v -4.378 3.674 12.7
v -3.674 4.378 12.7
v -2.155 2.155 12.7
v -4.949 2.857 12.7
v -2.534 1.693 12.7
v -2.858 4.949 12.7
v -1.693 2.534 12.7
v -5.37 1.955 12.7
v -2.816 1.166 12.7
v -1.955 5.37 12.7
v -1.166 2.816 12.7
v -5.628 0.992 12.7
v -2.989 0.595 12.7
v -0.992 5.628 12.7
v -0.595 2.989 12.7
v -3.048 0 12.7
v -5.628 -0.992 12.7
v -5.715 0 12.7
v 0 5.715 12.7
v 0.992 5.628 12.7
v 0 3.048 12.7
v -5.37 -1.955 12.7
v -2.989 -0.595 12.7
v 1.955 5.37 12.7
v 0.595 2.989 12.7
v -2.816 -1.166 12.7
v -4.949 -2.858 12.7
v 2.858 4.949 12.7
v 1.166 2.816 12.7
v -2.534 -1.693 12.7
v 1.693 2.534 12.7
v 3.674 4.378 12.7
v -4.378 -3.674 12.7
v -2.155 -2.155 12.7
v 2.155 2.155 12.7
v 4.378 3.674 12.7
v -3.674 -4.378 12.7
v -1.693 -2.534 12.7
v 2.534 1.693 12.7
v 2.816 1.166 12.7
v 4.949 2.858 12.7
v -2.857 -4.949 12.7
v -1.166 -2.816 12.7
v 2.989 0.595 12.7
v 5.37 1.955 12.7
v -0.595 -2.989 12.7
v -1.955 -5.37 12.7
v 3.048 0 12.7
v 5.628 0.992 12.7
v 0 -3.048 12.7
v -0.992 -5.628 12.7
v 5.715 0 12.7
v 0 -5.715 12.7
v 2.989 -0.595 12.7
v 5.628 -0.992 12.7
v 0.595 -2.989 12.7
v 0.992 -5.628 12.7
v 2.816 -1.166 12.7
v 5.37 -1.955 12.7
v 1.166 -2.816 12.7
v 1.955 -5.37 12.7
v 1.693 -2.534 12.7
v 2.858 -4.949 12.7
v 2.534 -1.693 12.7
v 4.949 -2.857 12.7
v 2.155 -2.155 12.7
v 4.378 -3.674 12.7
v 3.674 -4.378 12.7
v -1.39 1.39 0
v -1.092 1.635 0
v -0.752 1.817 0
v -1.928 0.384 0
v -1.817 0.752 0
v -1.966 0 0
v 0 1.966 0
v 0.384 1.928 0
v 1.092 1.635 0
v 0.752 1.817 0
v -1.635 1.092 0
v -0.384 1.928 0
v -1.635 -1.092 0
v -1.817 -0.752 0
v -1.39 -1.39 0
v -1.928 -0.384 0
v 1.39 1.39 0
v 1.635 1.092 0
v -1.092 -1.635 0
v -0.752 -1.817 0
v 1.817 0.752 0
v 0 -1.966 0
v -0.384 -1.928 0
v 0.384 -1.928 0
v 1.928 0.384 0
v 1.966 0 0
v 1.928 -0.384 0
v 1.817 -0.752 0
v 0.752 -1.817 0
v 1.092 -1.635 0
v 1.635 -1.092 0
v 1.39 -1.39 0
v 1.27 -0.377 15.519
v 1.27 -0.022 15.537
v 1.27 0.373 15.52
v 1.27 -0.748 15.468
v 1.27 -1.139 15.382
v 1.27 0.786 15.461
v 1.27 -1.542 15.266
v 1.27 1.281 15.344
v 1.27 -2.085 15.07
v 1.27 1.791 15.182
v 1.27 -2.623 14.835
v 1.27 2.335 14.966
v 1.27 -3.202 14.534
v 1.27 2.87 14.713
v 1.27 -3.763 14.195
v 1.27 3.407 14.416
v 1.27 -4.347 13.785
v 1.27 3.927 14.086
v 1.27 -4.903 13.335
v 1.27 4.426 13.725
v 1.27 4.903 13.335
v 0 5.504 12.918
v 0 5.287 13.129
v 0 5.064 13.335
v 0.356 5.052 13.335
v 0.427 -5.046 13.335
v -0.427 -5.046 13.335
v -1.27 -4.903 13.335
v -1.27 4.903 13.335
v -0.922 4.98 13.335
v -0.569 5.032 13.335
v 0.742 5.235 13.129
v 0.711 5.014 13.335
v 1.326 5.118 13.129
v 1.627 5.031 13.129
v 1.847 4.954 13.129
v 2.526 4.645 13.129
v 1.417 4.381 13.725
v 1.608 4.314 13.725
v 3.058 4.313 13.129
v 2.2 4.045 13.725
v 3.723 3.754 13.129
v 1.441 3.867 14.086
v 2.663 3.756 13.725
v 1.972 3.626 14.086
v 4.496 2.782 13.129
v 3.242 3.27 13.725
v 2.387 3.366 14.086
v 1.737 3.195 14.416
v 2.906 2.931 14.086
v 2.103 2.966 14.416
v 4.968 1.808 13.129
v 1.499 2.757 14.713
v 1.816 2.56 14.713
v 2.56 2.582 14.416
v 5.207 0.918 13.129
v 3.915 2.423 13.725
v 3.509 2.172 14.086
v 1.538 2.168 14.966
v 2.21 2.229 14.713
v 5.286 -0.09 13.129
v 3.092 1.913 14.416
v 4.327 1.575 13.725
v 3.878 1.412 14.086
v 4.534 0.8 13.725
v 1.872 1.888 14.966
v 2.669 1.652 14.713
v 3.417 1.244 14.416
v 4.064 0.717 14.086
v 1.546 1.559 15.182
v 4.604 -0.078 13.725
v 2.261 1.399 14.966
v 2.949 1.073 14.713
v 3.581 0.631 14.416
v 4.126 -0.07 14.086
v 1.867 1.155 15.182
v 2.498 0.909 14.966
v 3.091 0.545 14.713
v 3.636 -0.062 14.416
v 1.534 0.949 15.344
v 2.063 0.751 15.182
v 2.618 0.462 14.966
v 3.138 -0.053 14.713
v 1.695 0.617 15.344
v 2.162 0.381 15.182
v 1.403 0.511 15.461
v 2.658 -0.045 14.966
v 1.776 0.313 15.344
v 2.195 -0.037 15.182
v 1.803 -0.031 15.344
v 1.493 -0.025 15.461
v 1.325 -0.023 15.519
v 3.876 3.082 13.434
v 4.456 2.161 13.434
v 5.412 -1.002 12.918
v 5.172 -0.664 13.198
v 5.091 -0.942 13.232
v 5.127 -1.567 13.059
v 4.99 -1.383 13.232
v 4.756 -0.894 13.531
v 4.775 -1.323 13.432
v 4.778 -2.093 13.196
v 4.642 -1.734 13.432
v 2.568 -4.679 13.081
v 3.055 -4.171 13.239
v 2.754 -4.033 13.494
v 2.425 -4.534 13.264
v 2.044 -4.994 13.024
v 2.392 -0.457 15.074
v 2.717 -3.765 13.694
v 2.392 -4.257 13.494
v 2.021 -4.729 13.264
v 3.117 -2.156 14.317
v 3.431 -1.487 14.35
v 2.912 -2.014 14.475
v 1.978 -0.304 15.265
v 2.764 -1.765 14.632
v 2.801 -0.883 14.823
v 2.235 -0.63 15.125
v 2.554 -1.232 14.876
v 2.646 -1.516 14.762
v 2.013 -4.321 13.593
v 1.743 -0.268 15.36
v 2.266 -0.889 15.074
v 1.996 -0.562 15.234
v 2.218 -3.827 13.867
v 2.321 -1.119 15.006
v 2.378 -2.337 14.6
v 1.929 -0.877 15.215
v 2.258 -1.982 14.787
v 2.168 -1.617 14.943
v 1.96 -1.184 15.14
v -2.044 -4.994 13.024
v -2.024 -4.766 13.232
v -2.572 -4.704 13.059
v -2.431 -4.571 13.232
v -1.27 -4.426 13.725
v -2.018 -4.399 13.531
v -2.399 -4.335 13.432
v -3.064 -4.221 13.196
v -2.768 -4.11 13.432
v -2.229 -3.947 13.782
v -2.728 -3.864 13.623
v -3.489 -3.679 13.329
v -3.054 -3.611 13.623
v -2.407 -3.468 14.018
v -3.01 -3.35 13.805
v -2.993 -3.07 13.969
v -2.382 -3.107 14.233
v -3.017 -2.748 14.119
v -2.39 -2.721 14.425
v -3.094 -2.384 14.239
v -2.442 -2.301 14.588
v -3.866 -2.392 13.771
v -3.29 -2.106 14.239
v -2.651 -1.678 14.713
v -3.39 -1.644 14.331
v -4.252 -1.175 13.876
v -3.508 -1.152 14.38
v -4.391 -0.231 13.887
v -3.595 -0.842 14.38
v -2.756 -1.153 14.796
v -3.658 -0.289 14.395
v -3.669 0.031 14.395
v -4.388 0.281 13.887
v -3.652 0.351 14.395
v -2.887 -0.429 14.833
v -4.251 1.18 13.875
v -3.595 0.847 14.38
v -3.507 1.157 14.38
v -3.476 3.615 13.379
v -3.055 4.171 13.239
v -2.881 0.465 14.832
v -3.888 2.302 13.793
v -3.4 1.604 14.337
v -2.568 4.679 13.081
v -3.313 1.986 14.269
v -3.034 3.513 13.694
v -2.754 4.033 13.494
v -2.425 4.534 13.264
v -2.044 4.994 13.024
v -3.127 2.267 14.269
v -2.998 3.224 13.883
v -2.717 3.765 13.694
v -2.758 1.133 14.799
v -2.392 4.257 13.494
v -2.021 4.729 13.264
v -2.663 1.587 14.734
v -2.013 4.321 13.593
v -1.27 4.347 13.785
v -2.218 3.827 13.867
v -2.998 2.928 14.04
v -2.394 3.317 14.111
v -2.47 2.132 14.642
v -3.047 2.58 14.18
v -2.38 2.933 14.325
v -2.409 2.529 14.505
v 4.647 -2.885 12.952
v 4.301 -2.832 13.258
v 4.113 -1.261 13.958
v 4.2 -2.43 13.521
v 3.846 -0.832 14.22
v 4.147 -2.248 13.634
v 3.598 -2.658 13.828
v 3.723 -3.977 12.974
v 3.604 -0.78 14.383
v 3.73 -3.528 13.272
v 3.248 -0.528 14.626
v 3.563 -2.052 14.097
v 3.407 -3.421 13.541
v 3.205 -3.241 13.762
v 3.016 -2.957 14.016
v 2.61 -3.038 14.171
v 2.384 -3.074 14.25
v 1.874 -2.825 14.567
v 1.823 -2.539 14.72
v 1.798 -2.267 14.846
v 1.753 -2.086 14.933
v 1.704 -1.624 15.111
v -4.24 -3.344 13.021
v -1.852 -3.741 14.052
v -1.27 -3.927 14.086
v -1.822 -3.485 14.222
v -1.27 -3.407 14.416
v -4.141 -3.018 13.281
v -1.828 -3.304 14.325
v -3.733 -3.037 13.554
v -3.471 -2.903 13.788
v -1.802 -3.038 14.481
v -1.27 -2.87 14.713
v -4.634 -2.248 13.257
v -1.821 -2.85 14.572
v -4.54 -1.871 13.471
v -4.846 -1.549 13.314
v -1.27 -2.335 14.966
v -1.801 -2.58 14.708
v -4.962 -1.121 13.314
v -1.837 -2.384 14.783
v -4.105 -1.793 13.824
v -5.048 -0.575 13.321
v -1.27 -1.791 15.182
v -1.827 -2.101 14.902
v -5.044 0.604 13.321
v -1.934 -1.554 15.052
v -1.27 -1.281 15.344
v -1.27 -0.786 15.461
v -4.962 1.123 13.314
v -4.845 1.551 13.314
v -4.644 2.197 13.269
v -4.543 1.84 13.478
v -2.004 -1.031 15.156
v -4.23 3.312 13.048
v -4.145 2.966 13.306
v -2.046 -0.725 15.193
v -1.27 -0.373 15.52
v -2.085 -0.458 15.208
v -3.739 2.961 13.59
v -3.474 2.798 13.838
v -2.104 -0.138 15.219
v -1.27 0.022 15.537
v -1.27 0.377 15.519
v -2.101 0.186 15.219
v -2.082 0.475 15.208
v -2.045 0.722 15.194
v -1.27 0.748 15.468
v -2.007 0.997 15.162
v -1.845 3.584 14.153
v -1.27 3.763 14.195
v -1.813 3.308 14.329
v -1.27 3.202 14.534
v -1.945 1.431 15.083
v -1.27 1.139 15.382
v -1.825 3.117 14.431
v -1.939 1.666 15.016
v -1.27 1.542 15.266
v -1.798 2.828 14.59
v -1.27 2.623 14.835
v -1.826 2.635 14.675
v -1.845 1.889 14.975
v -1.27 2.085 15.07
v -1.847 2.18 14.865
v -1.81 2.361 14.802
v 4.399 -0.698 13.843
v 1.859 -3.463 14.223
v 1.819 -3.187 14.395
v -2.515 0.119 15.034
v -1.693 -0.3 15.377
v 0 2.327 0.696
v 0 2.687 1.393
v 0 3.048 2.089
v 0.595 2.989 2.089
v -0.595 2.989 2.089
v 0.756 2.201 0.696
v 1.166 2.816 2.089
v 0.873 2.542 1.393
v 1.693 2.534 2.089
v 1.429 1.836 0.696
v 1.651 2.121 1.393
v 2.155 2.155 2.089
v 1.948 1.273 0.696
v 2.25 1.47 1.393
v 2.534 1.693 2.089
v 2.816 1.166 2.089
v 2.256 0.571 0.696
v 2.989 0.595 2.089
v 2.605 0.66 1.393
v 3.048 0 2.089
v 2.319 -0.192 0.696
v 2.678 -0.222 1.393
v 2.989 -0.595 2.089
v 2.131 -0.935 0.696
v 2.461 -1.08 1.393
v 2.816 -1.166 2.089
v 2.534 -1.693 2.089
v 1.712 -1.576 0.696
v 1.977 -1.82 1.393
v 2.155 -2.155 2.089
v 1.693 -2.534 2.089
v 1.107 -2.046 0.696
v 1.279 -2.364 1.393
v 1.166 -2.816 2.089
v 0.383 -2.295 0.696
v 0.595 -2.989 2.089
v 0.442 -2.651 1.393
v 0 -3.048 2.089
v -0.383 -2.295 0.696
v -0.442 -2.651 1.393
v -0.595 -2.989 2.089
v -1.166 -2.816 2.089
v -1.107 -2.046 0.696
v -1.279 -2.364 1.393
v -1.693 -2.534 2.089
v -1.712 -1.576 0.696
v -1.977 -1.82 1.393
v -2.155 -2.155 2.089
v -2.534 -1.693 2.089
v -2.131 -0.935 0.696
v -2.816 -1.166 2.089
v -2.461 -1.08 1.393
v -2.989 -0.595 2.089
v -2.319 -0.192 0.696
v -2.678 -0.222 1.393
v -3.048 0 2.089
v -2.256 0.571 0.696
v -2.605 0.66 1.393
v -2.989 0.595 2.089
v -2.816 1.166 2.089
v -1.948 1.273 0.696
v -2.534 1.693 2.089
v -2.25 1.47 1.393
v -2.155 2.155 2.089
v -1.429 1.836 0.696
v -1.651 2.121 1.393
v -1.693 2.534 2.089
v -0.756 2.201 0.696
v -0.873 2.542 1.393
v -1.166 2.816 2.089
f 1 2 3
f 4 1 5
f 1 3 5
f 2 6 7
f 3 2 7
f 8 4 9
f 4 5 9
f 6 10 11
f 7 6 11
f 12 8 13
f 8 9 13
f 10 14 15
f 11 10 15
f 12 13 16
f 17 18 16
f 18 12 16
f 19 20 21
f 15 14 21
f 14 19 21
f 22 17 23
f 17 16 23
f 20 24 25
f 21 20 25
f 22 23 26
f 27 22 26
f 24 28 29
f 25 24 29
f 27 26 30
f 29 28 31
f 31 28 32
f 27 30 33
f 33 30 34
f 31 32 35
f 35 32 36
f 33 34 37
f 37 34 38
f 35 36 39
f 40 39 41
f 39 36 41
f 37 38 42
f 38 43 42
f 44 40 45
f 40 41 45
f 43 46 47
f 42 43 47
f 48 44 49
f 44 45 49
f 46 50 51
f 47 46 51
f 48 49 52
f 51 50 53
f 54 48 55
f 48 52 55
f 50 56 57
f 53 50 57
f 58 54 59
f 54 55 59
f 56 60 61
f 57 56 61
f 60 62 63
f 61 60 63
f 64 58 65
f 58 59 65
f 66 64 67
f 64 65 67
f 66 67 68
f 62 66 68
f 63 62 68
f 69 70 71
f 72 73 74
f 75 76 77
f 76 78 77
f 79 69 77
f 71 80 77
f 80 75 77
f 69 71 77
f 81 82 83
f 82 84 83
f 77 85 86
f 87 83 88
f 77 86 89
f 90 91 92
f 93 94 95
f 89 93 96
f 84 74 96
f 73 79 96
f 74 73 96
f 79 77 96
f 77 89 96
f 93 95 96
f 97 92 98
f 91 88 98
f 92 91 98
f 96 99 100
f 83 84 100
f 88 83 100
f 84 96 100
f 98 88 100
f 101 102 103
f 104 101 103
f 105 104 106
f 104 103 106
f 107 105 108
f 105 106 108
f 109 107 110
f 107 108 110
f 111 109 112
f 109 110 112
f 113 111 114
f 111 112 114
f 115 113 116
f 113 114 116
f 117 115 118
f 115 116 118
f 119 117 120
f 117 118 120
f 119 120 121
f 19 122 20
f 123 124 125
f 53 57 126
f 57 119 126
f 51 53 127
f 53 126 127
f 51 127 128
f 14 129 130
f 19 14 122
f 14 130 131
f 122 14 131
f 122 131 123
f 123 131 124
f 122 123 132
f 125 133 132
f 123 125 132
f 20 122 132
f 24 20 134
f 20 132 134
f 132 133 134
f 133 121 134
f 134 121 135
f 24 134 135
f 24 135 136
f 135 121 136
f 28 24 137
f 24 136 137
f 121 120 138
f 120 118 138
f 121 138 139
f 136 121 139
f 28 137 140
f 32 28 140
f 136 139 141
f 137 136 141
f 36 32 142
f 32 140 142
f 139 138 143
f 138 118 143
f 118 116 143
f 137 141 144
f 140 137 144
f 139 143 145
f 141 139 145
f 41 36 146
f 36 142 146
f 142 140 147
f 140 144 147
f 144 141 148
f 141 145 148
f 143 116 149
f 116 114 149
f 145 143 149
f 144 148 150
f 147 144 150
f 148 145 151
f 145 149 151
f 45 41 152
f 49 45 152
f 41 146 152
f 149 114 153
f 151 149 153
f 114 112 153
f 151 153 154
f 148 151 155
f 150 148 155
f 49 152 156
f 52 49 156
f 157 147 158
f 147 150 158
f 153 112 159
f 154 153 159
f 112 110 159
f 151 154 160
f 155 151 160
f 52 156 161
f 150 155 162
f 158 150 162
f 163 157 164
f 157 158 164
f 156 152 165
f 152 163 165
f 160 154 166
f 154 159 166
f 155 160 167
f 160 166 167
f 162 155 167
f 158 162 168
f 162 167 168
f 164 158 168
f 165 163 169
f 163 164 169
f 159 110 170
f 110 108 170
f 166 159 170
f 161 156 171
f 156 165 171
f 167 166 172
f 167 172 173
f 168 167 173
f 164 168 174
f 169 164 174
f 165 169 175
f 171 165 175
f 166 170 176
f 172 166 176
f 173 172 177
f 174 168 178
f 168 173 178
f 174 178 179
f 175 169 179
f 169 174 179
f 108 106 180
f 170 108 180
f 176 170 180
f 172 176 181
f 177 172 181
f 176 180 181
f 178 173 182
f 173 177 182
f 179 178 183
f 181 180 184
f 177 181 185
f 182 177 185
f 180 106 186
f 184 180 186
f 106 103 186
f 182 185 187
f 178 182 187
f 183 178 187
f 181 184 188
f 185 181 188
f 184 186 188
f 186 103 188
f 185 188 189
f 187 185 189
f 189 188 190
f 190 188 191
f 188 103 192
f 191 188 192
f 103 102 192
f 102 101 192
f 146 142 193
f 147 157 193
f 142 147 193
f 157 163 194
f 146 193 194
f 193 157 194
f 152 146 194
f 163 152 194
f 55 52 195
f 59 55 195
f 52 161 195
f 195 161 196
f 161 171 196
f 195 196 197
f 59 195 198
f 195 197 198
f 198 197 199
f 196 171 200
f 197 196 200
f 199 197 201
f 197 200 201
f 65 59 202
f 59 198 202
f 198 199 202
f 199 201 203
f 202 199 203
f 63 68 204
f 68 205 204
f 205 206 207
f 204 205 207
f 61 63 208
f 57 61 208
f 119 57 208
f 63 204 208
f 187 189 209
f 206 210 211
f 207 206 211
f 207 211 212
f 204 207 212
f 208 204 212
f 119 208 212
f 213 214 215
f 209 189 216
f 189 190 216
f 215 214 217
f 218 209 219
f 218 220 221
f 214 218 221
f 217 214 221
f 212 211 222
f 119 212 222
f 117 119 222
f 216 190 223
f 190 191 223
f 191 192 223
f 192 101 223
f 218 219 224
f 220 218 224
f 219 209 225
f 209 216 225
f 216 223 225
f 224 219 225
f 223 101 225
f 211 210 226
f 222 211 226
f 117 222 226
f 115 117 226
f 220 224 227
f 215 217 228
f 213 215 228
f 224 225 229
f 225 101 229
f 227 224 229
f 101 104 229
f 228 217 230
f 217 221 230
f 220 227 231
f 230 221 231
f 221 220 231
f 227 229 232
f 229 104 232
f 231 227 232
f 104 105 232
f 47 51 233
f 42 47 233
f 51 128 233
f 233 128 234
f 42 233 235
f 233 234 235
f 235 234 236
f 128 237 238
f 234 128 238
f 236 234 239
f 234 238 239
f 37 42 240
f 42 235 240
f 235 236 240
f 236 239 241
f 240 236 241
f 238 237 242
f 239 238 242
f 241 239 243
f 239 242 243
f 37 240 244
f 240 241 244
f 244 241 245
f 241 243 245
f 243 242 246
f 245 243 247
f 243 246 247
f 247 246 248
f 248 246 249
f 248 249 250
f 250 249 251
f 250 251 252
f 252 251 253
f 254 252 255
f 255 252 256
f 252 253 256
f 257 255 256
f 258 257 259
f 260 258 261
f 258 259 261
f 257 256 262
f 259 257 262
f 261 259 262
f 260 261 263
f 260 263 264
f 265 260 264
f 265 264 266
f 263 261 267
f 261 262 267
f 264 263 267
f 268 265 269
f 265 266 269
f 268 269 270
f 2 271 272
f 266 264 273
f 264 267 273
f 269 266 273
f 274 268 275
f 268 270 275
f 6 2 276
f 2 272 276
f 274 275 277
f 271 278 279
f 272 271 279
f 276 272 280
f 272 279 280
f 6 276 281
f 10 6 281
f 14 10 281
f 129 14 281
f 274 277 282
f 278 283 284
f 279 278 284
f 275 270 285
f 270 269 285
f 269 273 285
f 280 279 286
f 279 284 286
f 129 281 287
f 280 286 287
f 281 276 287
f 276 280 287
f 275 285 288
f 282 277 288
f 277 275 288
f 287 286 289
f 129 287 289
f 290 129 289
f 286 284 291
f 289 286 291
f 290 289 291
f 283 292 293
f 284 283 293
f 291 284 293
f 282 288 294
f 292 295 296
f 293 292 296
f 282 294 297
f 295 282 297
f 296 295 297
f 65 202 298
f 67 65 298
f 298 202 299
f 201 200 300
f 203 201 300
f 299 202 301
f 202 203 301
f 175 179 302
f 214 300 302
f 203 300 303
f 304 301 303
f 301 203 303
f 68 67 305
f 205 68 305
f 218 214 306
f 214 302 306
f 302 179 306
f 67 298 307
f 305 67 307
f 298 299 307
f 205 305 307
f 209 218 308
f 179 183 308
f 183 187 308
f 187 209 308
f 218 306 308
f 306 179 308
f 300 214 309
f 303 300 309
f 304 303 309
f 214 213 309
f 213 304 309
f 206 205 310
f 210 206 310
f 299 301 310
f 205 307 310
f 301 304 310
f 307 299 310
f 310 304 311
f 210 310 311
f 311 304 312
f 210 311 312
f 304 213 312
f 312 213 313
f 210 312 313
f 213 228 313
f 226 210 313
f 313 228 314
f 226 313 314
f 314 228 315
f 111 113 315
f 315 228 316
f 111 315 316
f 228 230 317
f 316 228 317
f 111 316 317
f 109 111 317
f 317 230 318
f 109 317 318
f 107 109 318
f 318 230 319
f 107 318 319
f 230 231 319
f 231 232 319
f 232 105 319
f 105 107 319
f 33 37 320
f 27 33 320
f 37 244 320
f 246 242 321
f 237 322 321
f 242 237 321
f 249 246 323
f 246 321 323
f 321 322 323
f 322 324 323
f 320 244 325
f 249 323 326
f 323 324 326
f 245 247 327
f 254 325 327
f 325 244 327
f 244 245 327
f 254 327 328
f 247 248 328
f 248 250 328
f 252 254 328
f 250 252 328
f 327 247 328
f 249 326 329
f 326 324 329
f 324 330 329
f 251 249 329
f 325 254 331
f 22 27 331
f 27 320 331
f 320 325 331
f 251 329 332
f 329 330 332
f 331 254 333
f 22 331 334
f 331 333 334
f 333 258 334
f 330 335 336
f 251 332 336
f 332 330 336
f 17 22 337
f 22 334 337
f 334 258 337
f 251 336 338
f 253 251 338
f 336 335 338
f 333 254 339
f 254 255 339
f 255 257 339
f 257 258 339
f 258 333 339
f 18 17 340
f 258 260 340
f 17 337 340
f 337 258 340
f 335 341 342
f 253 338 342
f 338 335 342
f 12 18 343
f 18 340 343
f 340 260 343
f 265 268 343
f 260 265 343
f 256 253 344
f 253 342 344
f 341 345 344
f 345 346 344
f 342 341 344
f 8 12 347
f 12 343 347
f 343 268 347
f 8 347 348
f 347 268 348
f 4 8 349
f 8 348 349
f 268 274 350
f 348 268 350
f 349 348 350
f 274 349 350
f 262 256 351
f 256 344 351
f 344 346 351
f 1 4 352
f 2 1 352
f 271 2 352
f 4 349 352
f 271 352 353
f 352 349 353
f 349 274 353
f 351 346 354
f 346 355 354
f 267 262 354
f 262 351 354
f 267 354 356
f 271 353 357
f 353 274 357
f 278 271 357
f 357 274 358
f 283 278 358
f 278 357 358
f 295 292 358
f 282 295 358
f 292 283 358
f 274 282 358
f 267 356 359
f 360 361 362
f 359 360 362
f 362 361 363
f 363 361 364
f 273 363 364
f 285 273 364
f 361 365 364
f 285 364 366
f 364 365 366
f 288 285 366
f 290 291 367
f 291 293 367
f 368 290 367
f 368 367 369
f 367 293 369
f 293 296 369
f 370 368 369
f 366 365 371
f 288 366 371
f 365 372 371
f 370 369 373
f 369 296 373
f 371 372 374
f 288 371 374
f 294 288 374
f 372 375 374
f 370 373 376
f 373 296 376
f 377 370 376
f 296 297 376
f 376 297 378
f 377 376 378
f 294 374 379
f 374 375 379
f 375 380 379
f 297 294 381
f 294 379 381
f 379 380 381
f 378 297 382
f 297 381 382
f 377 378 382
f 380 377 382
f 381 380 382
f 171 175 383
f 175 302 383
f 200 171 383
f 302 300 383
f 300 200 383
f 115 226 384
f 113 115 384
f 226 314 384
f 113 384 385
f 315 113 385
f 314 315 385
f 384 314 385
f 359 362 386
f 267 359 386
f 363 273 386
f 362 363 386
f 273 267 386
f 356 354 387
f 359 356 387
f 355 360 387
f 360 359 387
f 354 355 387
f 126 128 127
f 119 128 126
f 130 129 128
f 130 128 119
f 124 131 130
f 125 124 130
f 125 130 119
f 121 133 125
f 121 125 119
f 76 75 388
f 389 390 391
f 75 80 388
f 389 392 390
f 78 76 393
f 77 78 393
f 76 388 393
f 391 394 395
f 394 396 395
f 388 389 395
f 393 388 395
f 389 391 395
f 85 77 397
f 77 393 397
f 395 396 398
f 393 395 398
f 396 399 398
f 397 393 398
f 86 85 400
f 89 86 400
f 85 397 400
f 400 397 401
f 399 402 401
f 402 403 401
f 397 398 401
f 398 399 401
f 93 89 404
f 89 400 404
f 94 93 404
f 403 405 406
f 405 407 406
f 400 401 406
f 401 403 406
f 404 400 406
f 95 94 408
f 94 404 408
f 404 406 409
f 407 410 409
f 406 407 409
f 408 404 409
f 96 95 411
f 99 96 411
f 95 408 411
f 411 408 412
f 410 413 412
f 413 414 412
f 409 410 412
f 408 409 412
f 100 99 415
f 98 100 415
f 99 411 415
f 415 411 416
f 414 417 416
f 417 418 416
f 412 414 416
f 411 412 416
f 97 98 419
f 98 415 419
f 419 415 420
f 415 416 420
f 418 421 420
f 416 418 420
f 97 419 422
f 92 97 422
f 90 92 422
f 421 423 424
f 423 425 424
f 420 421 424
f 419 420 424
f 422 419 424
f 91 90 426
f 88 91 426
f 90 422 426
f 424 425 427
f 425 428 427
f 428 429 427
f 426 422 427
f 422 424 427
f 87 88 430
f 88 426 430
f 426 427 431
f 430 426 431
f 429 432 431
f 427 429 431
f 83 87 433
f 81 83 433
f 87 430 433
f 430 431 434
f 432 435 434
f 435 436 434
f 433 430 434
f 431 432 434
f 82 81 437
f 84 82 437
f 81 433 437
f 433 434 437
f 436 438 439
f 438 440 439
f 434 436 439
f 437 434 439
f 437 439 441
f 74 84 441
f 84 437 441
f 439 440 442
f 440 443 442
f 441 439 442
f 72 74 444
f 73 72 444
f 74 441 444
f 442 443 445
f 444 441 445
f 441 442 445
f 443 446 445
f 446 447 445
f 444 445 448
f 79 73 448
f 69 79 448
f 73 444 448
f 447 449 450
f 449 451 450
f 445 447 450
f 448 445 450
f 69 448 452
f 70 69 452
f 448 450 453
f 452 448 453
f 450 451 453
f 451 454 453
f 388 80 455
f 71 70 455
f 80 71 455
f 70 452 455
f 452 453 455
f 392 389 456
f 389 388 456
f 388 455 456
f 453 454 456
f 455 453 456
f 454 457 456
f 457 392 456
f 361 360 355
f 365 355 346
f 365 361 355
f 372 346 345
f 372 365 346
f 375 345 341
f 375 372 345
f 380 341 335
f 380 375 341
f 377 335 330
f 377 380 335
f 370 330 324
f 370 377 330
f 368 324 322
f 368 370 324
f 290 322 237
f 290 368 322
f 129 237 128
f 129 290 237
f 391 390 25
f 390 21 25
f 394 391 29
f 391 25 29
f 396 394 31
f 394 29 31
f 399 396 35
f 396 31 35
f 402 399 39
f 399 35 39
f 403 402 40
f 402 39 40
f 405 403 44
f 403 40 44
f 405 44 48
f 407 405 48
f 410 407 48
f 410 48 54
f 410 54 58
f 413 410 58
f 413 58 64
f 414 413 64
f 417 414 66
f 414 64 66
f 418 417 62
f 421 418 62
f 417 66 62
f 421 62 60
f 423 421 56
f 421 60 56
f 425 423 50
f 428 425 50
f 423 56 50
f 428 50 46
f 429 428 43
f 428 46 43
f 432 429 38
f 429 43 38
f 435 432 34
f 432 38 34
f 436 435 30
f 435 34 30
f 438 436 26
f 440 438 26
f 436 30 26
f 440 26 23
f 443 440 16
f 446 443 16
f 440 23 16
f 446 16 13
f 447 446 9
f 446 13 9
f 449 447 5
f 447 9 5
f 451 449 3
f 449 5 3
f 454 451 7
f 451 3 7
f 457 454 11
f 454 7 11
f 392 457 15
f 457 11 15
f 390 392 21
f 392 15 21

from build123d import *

# Parameters (mm, degrees)
F3_W     = 2.54
F3_H     = 10.16
F4_DEPTH = 2.54


with BuildPart() as f1:
    # F0 (on Right) → F1 (revolve)
    with BuildSketch(Plane.YZ):
        with BuildLine():
            ThreePointArc((5.715, 12.7), (3.104294, 14.73173), (0, 15.875))
            Line((0, 15.875), (0, 0))
            Line((0, 0), (1.966236, 0))
            Line((1.966236, 0), (3.048, 2.089057))
            Line((3.048, 2.089057), (3.048, 12.7))
            Line((3.048, 12.7), (5.715, 12.7))
        make_face()
    revolve(axis=Axis((0, 0, 7.9375), (0, 0, -1)))

    # F3 (on offset) → F4 (cut)
    with BuildSketch(Plane.XY.offset(15.875)):
        Rectangle(F3_W, F3_H)
    extrude(amount=-F4_DEPTH, mode=Mode.SUBTRACT)


solid = f1.part
